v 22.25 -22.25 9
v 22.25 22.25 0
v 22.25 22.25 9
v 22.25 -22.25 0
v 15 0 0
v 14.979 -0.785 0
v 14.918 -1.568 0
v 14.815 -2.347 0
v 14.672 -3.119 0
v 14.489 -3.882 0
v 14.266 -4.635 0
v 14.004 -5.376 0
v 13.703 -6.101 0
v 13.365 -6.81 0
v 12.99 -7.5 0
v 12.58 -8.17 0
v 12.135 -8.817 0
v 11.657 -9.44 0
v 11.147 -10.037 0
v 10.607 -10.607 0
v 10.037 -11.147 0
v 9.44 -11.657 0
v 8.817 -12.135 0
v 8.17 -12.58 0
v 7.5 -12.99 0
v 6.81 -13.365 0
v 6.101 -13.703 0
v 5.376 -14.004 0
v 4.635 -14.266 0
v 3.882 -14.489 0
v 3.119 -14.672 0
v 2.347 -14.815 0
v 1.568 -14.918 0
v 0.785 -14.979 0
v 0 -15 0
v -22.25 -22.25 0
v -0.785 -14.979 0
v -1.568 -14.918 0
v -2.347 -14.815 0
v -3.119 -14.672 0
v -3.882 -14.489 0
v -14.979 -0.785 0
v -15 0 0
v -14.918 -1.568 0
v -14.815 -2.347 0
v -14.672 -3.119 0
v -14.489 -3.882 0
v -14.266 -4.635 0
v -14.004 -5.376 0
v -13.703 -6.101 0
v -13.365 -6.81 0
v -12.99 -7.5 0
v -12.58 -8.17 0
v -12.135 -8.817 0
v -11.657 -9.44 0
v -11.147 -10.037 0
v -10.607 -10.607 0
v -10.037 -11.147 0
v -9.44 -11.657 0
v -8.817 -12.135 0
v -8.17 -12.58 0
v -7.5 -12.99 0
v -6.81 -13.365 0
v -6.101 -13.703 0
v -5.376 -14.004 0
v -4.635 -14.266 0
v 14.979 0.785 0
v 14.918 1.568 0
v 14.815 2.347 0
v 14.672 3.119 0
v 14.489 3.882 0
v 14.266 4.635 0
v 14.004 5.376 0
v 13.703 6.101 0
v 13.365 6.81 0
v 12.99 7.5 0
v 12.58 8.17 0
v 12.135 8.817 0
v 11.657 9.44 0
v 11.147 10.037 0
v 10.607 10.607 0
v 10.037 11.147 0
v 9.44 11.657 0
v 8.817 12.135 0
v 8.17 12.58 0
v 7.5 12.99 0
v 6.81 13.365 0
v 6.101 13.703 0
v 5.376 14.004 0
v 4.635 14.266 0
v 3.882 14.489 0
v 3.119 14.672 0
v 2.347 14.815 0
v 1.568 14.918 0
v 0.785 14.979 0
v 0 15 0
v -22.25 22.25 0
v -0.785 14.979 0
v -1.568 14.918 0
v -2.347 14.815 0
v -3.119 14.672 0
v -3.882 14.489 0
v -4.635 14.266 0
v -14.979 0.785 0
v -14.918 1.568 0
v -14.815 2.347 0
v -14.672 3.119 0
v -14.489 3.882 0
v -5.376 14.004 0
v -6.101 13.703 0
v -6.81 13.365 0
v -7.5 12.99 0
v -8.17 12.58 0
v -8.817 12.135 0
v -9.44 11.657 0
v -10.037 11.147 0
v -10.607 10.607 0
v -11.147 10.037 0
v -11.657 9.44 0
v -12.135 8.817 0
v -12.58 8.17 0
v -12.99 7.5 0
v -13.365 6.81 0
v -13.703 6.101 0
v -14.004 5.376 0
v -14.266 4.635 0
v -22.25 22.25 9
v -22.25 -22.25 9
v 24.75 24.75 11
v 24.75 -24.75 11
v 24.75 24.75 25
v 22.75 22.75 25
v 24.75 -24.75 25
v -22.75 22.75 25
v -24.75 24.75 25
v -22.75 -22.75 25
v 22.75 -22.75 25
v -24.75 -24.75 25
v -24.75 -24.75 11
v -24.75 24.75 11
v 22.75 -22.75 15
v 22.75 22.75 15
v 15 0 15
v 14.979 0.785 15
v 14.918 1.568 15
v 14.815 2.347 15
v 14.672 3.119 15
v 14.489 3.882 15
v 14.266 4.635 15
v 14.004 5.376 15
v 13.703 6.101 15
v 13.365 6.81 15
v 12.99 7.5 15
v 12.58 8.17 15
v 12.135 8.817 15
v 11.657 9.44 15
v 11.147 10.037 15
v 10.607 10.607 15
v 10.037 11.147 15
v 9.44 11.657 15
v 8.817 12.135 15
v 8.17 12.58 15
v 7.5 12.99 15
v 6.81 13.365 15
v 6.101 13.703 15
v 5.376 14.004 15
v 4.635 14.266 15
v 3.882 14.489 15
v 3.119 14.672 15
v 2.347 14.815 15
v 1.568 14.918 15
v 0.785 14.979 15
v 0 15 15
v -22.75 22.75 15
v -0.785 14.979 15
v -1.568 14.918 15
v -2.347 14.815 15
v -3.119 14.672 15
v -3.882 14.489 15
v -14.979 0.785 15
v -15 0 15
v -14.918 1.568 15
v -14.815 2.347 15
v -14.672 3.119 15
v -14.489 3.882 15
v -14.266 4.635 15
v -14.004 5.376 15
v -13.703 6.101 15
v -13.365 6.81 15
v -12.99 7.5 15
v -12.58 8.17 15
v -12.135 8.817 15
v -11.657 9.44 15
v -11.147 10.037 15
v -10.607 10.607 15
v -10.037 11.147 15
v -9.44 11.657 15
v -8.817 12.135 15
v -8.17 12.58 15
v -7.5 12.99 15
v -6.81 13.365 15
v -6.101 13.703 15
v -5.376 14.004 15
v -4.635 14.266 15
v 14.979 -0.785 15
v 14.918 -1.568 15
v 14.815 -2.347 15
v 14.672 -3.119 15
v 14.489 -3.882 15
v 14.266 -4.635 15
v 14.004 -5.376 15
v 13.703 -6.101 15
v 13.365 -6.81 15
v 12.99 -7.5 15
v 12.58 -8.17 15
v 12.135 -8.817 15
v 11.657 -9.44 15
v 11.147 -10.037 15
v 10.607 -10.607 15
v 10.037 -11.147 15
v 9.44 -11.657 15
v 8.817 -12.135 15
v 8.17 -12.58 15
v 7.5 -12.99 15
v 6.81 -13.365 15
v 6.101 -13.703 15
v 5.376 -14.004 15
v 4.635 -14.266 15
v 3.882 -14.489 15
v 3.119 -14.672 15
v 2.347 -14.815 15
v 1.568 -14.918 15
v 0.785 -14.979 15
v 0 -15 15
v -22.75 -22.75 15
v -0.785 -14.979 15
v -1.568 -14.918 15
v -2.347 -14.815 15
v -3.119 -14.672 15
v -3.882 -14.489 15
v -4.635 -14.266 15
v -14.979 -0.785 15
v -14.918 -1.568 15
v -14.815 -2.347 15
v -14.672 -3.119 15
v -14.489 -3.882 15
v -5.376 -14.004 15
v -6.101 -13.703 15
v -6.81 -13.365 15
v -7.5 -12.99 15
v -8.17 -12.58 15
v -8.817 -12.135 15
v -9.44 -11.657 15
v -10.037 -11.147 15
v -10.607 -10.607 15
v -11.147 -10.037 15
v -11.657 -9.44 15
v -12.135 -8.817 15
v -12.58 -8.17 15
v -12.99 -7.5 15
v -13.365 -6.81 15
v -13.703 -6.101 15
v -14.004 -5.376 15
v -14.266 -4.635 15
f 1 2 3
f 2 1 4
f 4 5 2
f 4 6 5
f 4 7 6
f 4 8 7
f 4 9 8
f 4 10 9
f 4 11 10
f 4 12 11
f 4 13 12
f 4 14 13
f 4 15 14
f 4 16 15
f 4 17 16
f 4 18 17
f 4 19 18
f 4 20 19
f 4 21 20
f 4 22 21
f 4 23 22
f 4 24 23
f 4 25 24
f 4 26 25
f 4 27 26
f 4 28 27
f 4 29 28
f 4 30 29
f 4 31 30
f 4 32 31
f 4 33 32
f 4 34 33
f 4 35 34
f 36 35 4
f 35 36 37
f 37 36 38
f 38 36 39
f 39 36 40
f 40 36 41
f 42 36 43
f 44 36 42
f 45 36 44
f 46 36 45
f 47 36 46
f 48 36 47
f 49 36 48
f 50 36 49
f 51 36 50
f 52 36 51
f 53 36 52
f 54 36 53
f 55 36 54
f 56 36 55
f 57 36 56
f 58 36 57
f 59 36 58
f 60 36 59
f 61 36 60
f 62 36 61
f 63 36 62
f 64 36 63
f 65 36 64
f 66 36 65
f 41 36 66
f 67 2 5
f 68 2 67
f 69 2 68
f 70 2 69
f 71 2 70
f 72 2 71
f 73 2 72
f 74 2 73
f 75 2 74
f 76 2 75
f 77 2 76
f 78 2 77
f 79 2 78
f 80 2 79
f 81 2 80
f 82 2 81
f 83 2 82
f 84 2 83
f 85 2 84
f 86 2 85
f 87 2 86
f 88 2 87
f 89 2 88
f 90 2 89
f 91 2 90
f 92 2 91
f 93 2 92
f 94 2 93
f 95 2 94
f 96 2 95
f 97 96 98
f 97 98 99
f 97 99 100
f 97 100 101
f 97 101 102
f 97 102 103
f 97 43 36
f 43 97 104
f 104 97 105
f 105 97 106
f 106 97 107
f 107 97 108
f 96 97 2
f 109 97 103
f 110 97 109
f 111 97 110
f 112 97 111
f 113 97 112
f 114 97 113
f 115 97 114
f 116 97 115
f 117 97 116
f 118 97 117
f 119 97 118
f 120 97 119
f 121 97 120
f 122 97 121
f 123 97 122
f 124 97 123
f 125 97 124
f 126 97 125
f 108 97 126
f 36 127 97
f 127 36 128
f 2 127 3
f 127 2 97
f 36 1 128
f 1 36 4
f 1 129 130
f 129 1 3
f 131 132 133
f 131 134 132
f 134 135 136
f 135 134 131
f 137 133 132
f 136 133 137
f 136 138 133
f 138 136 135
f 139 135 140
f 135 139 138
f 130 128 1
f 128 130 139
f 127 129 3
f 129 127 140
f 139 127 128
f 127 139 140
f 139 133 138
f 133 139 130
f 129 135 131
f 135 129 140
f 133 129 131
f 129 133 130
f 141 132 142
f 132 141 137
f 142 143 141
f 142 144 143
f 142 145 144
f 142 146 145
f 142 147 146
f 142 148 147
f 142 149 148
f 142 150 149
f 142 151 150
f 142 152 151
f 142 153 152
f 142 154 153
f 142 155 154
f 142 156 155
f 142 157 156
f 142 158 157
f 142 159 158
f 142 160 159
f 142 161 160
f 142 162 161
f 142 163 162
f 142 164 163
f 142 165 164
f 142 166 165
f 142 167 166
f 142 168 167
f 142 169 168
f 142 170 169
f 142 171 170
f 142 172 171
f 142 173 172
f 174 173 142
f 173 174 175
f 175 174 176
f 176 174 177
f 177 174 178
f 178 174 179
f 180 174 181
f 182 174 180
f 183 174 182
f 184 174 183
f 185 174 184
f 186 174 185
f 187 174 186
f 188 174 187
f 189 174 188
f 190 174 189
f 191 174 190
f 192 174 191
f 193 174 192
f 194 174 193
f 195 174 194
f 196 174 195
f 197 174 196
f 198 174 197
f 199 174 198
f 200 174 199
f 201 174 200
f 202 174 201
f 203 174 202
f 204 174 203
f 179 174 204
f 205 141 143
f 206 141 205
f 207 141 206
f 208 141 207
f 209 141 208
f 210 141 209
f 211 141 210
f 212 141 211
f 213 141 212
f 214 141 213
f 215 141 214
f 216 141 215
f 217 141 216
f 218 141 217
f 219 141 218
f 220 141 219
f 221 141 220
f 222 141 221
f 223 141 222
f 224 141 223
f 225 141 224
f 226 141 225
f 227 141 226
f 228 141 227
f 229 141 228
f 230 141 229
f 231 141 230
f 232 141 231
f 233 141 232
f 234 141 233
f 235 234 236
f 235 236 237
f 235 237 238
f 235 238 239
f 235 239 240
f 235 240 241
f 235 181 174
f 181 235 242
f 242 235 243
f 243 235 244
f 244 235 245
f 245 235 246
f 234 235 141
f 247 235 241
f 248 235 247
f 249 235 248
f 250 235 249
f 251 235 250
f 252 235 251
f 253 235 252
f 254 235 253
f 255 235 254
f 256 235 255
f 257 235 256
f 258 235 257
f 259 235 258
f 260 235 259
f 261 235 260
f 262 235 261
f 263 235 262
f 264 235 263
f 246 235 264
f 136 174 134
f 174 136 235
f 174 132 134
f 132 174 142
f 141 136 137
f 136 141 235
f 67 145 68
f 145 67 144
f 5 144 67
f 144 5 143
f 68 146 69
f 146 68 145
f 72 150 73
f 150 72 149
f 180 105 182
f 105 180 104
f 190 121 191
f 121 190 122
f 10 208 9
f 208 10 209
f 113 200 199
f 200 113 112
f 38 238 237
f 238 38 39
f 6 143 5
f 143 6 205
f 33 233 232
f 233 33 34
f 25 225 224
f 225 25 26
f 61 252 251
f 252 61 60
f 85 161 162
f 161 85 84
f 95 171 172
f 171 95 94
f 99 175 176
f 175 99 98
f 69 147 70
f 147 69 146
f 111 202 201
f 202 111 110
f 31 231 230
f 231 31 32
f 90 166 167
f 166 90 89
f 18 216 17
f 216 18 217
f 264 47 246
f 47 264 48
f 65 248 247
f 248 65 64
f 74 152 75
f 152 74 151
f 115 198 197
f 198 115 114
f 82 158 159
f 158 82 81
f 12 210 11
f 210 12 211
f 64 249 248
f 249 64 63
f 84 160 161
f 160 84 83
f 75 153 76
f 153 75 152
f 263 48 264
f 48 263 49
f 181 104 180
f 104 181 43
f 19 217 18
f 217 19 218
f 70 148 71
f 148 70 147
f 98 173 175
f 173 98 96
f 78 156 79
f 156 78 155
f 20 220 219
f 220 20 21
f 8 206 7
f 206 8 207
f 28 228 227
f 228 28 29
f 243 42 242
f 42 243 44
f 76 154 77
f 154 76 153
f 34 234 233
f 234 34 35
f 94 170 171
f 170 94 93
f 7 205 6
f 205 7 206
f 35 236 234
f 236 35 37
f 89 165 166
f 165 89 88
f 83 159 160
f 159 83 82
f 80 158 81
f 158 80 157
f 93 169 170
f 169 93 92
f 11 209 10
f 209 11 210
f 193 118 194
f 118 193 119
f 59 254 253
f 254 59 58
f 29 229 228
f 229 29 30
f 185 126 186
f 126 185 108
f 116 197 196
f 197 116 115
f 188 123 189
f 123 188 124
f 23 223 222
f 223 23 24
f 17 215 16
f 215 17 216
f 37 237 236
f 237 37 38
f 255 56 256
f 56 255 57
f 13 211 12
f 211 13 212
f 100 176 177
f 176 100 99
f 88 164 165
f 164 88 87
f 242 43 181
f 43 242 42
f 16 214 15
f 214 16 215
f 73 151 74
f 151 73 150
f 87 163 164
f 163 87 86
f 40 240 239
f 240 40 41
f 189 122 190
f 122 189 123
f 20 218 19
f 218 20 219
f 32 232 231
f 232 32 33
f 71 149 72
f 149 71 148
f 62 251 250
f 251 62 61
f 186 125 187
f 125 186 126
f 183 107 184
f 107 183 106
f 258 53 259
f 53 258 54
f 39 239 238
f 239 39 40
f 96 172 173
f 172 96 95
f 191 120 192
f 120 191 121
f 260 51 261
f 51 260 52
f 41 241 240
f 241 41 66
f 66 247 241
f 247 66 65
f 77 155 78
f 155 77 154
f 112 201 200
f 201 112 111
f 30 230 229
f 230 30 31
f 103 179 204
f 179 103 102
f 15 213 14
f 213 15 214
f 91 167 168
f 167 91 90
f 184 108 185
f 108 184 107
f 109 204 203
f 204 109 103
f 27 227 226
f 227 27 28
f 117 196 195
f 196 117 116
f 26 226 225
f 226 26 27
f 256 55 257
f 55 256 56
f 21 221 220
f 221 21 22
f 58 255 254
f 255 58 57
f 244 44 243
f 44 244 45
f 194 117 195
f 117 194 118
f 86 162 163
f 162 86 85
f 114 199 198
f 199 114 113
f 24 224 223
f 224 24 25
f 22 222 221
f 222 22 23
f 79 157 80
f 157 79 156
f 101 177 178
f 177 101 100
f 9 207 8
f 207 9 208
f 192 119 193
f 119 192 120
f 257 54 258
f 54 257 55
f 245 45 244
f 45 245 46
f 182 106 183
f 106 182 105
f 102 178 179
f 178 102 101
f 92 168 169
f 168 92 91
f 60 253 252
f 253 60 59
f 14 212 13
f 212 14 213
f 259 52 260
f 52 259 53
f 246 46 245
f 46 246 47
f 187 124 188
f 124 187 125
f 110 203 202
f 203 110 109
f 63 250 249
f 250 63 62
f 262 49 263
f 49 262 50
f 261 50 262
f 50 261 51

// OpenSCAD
//
//  parametric furniture foot extension
//  for leveling furniture on uneven floors
//  but also uneven furniture on even floors
//

extension = 15.0; // amount of extension needed

fsize_x = 44.5; // size of furniture foot
fsize_y = 44.5; // size of furniture foot
holedia = 30.0; // central hole, if desired, can be zero
wall = 2.0; // outer wall (fence) thickness
minwall = 0.0; // minimum outer wall total height (can be zero)
fence = 10.0; // minimum outer wall overlap of original foot 

tol = 0.5; // tolerance

d = 1*0.1;

difference () {
    union () { // add:
        translate([-fsize_x/2, -fsize_y/2, 0]) cube([fsize_x, fsize_y, extension]);
        hull () {
            translate([-fsize_x/2-tol-wall, -fsize_y/2-tol-wall, min(extension-2*wall,extension+fence-minwall)]) cube([fsize_x+2*tol+2*wall, fsize_y+2*tol+2*wall, max(2*wall+fence, minwall)]);
            translate([-fsize_x/2, -fsize_y/2, extension-2*wall-wall]) cube([fsize_x, fsize_y, wall]);
        }    
    }
    union () { //sub:
        // hole for furniture foot:
        translate([-fsize_x/2-tol, -fsize_y/2-tol, extension]) cube([fsize_x+2*tol, fsize_y+2*tol, max(minwall,fence)+d]);
        // any excess "below the surface":
        translate([-fsize_x/2-tol-wall-d, -fsize_y/2-tol-wall-d, -(wall+max(minwall,fence)+d)]) cube([fsize_x+2*tol+2*wall+2*d, fsize_y+2*tol+2*wall+2*d, wall+max(minwall,fence)+d]);
        // central hole:
        translate([0, 0, -(wall+max(minwall,fence)+d)]) cylinder(d=holedia, h=d+wall+max(minwall,fence)+extension+max(minwall,fence)+d, $fn=120);
    }
}
